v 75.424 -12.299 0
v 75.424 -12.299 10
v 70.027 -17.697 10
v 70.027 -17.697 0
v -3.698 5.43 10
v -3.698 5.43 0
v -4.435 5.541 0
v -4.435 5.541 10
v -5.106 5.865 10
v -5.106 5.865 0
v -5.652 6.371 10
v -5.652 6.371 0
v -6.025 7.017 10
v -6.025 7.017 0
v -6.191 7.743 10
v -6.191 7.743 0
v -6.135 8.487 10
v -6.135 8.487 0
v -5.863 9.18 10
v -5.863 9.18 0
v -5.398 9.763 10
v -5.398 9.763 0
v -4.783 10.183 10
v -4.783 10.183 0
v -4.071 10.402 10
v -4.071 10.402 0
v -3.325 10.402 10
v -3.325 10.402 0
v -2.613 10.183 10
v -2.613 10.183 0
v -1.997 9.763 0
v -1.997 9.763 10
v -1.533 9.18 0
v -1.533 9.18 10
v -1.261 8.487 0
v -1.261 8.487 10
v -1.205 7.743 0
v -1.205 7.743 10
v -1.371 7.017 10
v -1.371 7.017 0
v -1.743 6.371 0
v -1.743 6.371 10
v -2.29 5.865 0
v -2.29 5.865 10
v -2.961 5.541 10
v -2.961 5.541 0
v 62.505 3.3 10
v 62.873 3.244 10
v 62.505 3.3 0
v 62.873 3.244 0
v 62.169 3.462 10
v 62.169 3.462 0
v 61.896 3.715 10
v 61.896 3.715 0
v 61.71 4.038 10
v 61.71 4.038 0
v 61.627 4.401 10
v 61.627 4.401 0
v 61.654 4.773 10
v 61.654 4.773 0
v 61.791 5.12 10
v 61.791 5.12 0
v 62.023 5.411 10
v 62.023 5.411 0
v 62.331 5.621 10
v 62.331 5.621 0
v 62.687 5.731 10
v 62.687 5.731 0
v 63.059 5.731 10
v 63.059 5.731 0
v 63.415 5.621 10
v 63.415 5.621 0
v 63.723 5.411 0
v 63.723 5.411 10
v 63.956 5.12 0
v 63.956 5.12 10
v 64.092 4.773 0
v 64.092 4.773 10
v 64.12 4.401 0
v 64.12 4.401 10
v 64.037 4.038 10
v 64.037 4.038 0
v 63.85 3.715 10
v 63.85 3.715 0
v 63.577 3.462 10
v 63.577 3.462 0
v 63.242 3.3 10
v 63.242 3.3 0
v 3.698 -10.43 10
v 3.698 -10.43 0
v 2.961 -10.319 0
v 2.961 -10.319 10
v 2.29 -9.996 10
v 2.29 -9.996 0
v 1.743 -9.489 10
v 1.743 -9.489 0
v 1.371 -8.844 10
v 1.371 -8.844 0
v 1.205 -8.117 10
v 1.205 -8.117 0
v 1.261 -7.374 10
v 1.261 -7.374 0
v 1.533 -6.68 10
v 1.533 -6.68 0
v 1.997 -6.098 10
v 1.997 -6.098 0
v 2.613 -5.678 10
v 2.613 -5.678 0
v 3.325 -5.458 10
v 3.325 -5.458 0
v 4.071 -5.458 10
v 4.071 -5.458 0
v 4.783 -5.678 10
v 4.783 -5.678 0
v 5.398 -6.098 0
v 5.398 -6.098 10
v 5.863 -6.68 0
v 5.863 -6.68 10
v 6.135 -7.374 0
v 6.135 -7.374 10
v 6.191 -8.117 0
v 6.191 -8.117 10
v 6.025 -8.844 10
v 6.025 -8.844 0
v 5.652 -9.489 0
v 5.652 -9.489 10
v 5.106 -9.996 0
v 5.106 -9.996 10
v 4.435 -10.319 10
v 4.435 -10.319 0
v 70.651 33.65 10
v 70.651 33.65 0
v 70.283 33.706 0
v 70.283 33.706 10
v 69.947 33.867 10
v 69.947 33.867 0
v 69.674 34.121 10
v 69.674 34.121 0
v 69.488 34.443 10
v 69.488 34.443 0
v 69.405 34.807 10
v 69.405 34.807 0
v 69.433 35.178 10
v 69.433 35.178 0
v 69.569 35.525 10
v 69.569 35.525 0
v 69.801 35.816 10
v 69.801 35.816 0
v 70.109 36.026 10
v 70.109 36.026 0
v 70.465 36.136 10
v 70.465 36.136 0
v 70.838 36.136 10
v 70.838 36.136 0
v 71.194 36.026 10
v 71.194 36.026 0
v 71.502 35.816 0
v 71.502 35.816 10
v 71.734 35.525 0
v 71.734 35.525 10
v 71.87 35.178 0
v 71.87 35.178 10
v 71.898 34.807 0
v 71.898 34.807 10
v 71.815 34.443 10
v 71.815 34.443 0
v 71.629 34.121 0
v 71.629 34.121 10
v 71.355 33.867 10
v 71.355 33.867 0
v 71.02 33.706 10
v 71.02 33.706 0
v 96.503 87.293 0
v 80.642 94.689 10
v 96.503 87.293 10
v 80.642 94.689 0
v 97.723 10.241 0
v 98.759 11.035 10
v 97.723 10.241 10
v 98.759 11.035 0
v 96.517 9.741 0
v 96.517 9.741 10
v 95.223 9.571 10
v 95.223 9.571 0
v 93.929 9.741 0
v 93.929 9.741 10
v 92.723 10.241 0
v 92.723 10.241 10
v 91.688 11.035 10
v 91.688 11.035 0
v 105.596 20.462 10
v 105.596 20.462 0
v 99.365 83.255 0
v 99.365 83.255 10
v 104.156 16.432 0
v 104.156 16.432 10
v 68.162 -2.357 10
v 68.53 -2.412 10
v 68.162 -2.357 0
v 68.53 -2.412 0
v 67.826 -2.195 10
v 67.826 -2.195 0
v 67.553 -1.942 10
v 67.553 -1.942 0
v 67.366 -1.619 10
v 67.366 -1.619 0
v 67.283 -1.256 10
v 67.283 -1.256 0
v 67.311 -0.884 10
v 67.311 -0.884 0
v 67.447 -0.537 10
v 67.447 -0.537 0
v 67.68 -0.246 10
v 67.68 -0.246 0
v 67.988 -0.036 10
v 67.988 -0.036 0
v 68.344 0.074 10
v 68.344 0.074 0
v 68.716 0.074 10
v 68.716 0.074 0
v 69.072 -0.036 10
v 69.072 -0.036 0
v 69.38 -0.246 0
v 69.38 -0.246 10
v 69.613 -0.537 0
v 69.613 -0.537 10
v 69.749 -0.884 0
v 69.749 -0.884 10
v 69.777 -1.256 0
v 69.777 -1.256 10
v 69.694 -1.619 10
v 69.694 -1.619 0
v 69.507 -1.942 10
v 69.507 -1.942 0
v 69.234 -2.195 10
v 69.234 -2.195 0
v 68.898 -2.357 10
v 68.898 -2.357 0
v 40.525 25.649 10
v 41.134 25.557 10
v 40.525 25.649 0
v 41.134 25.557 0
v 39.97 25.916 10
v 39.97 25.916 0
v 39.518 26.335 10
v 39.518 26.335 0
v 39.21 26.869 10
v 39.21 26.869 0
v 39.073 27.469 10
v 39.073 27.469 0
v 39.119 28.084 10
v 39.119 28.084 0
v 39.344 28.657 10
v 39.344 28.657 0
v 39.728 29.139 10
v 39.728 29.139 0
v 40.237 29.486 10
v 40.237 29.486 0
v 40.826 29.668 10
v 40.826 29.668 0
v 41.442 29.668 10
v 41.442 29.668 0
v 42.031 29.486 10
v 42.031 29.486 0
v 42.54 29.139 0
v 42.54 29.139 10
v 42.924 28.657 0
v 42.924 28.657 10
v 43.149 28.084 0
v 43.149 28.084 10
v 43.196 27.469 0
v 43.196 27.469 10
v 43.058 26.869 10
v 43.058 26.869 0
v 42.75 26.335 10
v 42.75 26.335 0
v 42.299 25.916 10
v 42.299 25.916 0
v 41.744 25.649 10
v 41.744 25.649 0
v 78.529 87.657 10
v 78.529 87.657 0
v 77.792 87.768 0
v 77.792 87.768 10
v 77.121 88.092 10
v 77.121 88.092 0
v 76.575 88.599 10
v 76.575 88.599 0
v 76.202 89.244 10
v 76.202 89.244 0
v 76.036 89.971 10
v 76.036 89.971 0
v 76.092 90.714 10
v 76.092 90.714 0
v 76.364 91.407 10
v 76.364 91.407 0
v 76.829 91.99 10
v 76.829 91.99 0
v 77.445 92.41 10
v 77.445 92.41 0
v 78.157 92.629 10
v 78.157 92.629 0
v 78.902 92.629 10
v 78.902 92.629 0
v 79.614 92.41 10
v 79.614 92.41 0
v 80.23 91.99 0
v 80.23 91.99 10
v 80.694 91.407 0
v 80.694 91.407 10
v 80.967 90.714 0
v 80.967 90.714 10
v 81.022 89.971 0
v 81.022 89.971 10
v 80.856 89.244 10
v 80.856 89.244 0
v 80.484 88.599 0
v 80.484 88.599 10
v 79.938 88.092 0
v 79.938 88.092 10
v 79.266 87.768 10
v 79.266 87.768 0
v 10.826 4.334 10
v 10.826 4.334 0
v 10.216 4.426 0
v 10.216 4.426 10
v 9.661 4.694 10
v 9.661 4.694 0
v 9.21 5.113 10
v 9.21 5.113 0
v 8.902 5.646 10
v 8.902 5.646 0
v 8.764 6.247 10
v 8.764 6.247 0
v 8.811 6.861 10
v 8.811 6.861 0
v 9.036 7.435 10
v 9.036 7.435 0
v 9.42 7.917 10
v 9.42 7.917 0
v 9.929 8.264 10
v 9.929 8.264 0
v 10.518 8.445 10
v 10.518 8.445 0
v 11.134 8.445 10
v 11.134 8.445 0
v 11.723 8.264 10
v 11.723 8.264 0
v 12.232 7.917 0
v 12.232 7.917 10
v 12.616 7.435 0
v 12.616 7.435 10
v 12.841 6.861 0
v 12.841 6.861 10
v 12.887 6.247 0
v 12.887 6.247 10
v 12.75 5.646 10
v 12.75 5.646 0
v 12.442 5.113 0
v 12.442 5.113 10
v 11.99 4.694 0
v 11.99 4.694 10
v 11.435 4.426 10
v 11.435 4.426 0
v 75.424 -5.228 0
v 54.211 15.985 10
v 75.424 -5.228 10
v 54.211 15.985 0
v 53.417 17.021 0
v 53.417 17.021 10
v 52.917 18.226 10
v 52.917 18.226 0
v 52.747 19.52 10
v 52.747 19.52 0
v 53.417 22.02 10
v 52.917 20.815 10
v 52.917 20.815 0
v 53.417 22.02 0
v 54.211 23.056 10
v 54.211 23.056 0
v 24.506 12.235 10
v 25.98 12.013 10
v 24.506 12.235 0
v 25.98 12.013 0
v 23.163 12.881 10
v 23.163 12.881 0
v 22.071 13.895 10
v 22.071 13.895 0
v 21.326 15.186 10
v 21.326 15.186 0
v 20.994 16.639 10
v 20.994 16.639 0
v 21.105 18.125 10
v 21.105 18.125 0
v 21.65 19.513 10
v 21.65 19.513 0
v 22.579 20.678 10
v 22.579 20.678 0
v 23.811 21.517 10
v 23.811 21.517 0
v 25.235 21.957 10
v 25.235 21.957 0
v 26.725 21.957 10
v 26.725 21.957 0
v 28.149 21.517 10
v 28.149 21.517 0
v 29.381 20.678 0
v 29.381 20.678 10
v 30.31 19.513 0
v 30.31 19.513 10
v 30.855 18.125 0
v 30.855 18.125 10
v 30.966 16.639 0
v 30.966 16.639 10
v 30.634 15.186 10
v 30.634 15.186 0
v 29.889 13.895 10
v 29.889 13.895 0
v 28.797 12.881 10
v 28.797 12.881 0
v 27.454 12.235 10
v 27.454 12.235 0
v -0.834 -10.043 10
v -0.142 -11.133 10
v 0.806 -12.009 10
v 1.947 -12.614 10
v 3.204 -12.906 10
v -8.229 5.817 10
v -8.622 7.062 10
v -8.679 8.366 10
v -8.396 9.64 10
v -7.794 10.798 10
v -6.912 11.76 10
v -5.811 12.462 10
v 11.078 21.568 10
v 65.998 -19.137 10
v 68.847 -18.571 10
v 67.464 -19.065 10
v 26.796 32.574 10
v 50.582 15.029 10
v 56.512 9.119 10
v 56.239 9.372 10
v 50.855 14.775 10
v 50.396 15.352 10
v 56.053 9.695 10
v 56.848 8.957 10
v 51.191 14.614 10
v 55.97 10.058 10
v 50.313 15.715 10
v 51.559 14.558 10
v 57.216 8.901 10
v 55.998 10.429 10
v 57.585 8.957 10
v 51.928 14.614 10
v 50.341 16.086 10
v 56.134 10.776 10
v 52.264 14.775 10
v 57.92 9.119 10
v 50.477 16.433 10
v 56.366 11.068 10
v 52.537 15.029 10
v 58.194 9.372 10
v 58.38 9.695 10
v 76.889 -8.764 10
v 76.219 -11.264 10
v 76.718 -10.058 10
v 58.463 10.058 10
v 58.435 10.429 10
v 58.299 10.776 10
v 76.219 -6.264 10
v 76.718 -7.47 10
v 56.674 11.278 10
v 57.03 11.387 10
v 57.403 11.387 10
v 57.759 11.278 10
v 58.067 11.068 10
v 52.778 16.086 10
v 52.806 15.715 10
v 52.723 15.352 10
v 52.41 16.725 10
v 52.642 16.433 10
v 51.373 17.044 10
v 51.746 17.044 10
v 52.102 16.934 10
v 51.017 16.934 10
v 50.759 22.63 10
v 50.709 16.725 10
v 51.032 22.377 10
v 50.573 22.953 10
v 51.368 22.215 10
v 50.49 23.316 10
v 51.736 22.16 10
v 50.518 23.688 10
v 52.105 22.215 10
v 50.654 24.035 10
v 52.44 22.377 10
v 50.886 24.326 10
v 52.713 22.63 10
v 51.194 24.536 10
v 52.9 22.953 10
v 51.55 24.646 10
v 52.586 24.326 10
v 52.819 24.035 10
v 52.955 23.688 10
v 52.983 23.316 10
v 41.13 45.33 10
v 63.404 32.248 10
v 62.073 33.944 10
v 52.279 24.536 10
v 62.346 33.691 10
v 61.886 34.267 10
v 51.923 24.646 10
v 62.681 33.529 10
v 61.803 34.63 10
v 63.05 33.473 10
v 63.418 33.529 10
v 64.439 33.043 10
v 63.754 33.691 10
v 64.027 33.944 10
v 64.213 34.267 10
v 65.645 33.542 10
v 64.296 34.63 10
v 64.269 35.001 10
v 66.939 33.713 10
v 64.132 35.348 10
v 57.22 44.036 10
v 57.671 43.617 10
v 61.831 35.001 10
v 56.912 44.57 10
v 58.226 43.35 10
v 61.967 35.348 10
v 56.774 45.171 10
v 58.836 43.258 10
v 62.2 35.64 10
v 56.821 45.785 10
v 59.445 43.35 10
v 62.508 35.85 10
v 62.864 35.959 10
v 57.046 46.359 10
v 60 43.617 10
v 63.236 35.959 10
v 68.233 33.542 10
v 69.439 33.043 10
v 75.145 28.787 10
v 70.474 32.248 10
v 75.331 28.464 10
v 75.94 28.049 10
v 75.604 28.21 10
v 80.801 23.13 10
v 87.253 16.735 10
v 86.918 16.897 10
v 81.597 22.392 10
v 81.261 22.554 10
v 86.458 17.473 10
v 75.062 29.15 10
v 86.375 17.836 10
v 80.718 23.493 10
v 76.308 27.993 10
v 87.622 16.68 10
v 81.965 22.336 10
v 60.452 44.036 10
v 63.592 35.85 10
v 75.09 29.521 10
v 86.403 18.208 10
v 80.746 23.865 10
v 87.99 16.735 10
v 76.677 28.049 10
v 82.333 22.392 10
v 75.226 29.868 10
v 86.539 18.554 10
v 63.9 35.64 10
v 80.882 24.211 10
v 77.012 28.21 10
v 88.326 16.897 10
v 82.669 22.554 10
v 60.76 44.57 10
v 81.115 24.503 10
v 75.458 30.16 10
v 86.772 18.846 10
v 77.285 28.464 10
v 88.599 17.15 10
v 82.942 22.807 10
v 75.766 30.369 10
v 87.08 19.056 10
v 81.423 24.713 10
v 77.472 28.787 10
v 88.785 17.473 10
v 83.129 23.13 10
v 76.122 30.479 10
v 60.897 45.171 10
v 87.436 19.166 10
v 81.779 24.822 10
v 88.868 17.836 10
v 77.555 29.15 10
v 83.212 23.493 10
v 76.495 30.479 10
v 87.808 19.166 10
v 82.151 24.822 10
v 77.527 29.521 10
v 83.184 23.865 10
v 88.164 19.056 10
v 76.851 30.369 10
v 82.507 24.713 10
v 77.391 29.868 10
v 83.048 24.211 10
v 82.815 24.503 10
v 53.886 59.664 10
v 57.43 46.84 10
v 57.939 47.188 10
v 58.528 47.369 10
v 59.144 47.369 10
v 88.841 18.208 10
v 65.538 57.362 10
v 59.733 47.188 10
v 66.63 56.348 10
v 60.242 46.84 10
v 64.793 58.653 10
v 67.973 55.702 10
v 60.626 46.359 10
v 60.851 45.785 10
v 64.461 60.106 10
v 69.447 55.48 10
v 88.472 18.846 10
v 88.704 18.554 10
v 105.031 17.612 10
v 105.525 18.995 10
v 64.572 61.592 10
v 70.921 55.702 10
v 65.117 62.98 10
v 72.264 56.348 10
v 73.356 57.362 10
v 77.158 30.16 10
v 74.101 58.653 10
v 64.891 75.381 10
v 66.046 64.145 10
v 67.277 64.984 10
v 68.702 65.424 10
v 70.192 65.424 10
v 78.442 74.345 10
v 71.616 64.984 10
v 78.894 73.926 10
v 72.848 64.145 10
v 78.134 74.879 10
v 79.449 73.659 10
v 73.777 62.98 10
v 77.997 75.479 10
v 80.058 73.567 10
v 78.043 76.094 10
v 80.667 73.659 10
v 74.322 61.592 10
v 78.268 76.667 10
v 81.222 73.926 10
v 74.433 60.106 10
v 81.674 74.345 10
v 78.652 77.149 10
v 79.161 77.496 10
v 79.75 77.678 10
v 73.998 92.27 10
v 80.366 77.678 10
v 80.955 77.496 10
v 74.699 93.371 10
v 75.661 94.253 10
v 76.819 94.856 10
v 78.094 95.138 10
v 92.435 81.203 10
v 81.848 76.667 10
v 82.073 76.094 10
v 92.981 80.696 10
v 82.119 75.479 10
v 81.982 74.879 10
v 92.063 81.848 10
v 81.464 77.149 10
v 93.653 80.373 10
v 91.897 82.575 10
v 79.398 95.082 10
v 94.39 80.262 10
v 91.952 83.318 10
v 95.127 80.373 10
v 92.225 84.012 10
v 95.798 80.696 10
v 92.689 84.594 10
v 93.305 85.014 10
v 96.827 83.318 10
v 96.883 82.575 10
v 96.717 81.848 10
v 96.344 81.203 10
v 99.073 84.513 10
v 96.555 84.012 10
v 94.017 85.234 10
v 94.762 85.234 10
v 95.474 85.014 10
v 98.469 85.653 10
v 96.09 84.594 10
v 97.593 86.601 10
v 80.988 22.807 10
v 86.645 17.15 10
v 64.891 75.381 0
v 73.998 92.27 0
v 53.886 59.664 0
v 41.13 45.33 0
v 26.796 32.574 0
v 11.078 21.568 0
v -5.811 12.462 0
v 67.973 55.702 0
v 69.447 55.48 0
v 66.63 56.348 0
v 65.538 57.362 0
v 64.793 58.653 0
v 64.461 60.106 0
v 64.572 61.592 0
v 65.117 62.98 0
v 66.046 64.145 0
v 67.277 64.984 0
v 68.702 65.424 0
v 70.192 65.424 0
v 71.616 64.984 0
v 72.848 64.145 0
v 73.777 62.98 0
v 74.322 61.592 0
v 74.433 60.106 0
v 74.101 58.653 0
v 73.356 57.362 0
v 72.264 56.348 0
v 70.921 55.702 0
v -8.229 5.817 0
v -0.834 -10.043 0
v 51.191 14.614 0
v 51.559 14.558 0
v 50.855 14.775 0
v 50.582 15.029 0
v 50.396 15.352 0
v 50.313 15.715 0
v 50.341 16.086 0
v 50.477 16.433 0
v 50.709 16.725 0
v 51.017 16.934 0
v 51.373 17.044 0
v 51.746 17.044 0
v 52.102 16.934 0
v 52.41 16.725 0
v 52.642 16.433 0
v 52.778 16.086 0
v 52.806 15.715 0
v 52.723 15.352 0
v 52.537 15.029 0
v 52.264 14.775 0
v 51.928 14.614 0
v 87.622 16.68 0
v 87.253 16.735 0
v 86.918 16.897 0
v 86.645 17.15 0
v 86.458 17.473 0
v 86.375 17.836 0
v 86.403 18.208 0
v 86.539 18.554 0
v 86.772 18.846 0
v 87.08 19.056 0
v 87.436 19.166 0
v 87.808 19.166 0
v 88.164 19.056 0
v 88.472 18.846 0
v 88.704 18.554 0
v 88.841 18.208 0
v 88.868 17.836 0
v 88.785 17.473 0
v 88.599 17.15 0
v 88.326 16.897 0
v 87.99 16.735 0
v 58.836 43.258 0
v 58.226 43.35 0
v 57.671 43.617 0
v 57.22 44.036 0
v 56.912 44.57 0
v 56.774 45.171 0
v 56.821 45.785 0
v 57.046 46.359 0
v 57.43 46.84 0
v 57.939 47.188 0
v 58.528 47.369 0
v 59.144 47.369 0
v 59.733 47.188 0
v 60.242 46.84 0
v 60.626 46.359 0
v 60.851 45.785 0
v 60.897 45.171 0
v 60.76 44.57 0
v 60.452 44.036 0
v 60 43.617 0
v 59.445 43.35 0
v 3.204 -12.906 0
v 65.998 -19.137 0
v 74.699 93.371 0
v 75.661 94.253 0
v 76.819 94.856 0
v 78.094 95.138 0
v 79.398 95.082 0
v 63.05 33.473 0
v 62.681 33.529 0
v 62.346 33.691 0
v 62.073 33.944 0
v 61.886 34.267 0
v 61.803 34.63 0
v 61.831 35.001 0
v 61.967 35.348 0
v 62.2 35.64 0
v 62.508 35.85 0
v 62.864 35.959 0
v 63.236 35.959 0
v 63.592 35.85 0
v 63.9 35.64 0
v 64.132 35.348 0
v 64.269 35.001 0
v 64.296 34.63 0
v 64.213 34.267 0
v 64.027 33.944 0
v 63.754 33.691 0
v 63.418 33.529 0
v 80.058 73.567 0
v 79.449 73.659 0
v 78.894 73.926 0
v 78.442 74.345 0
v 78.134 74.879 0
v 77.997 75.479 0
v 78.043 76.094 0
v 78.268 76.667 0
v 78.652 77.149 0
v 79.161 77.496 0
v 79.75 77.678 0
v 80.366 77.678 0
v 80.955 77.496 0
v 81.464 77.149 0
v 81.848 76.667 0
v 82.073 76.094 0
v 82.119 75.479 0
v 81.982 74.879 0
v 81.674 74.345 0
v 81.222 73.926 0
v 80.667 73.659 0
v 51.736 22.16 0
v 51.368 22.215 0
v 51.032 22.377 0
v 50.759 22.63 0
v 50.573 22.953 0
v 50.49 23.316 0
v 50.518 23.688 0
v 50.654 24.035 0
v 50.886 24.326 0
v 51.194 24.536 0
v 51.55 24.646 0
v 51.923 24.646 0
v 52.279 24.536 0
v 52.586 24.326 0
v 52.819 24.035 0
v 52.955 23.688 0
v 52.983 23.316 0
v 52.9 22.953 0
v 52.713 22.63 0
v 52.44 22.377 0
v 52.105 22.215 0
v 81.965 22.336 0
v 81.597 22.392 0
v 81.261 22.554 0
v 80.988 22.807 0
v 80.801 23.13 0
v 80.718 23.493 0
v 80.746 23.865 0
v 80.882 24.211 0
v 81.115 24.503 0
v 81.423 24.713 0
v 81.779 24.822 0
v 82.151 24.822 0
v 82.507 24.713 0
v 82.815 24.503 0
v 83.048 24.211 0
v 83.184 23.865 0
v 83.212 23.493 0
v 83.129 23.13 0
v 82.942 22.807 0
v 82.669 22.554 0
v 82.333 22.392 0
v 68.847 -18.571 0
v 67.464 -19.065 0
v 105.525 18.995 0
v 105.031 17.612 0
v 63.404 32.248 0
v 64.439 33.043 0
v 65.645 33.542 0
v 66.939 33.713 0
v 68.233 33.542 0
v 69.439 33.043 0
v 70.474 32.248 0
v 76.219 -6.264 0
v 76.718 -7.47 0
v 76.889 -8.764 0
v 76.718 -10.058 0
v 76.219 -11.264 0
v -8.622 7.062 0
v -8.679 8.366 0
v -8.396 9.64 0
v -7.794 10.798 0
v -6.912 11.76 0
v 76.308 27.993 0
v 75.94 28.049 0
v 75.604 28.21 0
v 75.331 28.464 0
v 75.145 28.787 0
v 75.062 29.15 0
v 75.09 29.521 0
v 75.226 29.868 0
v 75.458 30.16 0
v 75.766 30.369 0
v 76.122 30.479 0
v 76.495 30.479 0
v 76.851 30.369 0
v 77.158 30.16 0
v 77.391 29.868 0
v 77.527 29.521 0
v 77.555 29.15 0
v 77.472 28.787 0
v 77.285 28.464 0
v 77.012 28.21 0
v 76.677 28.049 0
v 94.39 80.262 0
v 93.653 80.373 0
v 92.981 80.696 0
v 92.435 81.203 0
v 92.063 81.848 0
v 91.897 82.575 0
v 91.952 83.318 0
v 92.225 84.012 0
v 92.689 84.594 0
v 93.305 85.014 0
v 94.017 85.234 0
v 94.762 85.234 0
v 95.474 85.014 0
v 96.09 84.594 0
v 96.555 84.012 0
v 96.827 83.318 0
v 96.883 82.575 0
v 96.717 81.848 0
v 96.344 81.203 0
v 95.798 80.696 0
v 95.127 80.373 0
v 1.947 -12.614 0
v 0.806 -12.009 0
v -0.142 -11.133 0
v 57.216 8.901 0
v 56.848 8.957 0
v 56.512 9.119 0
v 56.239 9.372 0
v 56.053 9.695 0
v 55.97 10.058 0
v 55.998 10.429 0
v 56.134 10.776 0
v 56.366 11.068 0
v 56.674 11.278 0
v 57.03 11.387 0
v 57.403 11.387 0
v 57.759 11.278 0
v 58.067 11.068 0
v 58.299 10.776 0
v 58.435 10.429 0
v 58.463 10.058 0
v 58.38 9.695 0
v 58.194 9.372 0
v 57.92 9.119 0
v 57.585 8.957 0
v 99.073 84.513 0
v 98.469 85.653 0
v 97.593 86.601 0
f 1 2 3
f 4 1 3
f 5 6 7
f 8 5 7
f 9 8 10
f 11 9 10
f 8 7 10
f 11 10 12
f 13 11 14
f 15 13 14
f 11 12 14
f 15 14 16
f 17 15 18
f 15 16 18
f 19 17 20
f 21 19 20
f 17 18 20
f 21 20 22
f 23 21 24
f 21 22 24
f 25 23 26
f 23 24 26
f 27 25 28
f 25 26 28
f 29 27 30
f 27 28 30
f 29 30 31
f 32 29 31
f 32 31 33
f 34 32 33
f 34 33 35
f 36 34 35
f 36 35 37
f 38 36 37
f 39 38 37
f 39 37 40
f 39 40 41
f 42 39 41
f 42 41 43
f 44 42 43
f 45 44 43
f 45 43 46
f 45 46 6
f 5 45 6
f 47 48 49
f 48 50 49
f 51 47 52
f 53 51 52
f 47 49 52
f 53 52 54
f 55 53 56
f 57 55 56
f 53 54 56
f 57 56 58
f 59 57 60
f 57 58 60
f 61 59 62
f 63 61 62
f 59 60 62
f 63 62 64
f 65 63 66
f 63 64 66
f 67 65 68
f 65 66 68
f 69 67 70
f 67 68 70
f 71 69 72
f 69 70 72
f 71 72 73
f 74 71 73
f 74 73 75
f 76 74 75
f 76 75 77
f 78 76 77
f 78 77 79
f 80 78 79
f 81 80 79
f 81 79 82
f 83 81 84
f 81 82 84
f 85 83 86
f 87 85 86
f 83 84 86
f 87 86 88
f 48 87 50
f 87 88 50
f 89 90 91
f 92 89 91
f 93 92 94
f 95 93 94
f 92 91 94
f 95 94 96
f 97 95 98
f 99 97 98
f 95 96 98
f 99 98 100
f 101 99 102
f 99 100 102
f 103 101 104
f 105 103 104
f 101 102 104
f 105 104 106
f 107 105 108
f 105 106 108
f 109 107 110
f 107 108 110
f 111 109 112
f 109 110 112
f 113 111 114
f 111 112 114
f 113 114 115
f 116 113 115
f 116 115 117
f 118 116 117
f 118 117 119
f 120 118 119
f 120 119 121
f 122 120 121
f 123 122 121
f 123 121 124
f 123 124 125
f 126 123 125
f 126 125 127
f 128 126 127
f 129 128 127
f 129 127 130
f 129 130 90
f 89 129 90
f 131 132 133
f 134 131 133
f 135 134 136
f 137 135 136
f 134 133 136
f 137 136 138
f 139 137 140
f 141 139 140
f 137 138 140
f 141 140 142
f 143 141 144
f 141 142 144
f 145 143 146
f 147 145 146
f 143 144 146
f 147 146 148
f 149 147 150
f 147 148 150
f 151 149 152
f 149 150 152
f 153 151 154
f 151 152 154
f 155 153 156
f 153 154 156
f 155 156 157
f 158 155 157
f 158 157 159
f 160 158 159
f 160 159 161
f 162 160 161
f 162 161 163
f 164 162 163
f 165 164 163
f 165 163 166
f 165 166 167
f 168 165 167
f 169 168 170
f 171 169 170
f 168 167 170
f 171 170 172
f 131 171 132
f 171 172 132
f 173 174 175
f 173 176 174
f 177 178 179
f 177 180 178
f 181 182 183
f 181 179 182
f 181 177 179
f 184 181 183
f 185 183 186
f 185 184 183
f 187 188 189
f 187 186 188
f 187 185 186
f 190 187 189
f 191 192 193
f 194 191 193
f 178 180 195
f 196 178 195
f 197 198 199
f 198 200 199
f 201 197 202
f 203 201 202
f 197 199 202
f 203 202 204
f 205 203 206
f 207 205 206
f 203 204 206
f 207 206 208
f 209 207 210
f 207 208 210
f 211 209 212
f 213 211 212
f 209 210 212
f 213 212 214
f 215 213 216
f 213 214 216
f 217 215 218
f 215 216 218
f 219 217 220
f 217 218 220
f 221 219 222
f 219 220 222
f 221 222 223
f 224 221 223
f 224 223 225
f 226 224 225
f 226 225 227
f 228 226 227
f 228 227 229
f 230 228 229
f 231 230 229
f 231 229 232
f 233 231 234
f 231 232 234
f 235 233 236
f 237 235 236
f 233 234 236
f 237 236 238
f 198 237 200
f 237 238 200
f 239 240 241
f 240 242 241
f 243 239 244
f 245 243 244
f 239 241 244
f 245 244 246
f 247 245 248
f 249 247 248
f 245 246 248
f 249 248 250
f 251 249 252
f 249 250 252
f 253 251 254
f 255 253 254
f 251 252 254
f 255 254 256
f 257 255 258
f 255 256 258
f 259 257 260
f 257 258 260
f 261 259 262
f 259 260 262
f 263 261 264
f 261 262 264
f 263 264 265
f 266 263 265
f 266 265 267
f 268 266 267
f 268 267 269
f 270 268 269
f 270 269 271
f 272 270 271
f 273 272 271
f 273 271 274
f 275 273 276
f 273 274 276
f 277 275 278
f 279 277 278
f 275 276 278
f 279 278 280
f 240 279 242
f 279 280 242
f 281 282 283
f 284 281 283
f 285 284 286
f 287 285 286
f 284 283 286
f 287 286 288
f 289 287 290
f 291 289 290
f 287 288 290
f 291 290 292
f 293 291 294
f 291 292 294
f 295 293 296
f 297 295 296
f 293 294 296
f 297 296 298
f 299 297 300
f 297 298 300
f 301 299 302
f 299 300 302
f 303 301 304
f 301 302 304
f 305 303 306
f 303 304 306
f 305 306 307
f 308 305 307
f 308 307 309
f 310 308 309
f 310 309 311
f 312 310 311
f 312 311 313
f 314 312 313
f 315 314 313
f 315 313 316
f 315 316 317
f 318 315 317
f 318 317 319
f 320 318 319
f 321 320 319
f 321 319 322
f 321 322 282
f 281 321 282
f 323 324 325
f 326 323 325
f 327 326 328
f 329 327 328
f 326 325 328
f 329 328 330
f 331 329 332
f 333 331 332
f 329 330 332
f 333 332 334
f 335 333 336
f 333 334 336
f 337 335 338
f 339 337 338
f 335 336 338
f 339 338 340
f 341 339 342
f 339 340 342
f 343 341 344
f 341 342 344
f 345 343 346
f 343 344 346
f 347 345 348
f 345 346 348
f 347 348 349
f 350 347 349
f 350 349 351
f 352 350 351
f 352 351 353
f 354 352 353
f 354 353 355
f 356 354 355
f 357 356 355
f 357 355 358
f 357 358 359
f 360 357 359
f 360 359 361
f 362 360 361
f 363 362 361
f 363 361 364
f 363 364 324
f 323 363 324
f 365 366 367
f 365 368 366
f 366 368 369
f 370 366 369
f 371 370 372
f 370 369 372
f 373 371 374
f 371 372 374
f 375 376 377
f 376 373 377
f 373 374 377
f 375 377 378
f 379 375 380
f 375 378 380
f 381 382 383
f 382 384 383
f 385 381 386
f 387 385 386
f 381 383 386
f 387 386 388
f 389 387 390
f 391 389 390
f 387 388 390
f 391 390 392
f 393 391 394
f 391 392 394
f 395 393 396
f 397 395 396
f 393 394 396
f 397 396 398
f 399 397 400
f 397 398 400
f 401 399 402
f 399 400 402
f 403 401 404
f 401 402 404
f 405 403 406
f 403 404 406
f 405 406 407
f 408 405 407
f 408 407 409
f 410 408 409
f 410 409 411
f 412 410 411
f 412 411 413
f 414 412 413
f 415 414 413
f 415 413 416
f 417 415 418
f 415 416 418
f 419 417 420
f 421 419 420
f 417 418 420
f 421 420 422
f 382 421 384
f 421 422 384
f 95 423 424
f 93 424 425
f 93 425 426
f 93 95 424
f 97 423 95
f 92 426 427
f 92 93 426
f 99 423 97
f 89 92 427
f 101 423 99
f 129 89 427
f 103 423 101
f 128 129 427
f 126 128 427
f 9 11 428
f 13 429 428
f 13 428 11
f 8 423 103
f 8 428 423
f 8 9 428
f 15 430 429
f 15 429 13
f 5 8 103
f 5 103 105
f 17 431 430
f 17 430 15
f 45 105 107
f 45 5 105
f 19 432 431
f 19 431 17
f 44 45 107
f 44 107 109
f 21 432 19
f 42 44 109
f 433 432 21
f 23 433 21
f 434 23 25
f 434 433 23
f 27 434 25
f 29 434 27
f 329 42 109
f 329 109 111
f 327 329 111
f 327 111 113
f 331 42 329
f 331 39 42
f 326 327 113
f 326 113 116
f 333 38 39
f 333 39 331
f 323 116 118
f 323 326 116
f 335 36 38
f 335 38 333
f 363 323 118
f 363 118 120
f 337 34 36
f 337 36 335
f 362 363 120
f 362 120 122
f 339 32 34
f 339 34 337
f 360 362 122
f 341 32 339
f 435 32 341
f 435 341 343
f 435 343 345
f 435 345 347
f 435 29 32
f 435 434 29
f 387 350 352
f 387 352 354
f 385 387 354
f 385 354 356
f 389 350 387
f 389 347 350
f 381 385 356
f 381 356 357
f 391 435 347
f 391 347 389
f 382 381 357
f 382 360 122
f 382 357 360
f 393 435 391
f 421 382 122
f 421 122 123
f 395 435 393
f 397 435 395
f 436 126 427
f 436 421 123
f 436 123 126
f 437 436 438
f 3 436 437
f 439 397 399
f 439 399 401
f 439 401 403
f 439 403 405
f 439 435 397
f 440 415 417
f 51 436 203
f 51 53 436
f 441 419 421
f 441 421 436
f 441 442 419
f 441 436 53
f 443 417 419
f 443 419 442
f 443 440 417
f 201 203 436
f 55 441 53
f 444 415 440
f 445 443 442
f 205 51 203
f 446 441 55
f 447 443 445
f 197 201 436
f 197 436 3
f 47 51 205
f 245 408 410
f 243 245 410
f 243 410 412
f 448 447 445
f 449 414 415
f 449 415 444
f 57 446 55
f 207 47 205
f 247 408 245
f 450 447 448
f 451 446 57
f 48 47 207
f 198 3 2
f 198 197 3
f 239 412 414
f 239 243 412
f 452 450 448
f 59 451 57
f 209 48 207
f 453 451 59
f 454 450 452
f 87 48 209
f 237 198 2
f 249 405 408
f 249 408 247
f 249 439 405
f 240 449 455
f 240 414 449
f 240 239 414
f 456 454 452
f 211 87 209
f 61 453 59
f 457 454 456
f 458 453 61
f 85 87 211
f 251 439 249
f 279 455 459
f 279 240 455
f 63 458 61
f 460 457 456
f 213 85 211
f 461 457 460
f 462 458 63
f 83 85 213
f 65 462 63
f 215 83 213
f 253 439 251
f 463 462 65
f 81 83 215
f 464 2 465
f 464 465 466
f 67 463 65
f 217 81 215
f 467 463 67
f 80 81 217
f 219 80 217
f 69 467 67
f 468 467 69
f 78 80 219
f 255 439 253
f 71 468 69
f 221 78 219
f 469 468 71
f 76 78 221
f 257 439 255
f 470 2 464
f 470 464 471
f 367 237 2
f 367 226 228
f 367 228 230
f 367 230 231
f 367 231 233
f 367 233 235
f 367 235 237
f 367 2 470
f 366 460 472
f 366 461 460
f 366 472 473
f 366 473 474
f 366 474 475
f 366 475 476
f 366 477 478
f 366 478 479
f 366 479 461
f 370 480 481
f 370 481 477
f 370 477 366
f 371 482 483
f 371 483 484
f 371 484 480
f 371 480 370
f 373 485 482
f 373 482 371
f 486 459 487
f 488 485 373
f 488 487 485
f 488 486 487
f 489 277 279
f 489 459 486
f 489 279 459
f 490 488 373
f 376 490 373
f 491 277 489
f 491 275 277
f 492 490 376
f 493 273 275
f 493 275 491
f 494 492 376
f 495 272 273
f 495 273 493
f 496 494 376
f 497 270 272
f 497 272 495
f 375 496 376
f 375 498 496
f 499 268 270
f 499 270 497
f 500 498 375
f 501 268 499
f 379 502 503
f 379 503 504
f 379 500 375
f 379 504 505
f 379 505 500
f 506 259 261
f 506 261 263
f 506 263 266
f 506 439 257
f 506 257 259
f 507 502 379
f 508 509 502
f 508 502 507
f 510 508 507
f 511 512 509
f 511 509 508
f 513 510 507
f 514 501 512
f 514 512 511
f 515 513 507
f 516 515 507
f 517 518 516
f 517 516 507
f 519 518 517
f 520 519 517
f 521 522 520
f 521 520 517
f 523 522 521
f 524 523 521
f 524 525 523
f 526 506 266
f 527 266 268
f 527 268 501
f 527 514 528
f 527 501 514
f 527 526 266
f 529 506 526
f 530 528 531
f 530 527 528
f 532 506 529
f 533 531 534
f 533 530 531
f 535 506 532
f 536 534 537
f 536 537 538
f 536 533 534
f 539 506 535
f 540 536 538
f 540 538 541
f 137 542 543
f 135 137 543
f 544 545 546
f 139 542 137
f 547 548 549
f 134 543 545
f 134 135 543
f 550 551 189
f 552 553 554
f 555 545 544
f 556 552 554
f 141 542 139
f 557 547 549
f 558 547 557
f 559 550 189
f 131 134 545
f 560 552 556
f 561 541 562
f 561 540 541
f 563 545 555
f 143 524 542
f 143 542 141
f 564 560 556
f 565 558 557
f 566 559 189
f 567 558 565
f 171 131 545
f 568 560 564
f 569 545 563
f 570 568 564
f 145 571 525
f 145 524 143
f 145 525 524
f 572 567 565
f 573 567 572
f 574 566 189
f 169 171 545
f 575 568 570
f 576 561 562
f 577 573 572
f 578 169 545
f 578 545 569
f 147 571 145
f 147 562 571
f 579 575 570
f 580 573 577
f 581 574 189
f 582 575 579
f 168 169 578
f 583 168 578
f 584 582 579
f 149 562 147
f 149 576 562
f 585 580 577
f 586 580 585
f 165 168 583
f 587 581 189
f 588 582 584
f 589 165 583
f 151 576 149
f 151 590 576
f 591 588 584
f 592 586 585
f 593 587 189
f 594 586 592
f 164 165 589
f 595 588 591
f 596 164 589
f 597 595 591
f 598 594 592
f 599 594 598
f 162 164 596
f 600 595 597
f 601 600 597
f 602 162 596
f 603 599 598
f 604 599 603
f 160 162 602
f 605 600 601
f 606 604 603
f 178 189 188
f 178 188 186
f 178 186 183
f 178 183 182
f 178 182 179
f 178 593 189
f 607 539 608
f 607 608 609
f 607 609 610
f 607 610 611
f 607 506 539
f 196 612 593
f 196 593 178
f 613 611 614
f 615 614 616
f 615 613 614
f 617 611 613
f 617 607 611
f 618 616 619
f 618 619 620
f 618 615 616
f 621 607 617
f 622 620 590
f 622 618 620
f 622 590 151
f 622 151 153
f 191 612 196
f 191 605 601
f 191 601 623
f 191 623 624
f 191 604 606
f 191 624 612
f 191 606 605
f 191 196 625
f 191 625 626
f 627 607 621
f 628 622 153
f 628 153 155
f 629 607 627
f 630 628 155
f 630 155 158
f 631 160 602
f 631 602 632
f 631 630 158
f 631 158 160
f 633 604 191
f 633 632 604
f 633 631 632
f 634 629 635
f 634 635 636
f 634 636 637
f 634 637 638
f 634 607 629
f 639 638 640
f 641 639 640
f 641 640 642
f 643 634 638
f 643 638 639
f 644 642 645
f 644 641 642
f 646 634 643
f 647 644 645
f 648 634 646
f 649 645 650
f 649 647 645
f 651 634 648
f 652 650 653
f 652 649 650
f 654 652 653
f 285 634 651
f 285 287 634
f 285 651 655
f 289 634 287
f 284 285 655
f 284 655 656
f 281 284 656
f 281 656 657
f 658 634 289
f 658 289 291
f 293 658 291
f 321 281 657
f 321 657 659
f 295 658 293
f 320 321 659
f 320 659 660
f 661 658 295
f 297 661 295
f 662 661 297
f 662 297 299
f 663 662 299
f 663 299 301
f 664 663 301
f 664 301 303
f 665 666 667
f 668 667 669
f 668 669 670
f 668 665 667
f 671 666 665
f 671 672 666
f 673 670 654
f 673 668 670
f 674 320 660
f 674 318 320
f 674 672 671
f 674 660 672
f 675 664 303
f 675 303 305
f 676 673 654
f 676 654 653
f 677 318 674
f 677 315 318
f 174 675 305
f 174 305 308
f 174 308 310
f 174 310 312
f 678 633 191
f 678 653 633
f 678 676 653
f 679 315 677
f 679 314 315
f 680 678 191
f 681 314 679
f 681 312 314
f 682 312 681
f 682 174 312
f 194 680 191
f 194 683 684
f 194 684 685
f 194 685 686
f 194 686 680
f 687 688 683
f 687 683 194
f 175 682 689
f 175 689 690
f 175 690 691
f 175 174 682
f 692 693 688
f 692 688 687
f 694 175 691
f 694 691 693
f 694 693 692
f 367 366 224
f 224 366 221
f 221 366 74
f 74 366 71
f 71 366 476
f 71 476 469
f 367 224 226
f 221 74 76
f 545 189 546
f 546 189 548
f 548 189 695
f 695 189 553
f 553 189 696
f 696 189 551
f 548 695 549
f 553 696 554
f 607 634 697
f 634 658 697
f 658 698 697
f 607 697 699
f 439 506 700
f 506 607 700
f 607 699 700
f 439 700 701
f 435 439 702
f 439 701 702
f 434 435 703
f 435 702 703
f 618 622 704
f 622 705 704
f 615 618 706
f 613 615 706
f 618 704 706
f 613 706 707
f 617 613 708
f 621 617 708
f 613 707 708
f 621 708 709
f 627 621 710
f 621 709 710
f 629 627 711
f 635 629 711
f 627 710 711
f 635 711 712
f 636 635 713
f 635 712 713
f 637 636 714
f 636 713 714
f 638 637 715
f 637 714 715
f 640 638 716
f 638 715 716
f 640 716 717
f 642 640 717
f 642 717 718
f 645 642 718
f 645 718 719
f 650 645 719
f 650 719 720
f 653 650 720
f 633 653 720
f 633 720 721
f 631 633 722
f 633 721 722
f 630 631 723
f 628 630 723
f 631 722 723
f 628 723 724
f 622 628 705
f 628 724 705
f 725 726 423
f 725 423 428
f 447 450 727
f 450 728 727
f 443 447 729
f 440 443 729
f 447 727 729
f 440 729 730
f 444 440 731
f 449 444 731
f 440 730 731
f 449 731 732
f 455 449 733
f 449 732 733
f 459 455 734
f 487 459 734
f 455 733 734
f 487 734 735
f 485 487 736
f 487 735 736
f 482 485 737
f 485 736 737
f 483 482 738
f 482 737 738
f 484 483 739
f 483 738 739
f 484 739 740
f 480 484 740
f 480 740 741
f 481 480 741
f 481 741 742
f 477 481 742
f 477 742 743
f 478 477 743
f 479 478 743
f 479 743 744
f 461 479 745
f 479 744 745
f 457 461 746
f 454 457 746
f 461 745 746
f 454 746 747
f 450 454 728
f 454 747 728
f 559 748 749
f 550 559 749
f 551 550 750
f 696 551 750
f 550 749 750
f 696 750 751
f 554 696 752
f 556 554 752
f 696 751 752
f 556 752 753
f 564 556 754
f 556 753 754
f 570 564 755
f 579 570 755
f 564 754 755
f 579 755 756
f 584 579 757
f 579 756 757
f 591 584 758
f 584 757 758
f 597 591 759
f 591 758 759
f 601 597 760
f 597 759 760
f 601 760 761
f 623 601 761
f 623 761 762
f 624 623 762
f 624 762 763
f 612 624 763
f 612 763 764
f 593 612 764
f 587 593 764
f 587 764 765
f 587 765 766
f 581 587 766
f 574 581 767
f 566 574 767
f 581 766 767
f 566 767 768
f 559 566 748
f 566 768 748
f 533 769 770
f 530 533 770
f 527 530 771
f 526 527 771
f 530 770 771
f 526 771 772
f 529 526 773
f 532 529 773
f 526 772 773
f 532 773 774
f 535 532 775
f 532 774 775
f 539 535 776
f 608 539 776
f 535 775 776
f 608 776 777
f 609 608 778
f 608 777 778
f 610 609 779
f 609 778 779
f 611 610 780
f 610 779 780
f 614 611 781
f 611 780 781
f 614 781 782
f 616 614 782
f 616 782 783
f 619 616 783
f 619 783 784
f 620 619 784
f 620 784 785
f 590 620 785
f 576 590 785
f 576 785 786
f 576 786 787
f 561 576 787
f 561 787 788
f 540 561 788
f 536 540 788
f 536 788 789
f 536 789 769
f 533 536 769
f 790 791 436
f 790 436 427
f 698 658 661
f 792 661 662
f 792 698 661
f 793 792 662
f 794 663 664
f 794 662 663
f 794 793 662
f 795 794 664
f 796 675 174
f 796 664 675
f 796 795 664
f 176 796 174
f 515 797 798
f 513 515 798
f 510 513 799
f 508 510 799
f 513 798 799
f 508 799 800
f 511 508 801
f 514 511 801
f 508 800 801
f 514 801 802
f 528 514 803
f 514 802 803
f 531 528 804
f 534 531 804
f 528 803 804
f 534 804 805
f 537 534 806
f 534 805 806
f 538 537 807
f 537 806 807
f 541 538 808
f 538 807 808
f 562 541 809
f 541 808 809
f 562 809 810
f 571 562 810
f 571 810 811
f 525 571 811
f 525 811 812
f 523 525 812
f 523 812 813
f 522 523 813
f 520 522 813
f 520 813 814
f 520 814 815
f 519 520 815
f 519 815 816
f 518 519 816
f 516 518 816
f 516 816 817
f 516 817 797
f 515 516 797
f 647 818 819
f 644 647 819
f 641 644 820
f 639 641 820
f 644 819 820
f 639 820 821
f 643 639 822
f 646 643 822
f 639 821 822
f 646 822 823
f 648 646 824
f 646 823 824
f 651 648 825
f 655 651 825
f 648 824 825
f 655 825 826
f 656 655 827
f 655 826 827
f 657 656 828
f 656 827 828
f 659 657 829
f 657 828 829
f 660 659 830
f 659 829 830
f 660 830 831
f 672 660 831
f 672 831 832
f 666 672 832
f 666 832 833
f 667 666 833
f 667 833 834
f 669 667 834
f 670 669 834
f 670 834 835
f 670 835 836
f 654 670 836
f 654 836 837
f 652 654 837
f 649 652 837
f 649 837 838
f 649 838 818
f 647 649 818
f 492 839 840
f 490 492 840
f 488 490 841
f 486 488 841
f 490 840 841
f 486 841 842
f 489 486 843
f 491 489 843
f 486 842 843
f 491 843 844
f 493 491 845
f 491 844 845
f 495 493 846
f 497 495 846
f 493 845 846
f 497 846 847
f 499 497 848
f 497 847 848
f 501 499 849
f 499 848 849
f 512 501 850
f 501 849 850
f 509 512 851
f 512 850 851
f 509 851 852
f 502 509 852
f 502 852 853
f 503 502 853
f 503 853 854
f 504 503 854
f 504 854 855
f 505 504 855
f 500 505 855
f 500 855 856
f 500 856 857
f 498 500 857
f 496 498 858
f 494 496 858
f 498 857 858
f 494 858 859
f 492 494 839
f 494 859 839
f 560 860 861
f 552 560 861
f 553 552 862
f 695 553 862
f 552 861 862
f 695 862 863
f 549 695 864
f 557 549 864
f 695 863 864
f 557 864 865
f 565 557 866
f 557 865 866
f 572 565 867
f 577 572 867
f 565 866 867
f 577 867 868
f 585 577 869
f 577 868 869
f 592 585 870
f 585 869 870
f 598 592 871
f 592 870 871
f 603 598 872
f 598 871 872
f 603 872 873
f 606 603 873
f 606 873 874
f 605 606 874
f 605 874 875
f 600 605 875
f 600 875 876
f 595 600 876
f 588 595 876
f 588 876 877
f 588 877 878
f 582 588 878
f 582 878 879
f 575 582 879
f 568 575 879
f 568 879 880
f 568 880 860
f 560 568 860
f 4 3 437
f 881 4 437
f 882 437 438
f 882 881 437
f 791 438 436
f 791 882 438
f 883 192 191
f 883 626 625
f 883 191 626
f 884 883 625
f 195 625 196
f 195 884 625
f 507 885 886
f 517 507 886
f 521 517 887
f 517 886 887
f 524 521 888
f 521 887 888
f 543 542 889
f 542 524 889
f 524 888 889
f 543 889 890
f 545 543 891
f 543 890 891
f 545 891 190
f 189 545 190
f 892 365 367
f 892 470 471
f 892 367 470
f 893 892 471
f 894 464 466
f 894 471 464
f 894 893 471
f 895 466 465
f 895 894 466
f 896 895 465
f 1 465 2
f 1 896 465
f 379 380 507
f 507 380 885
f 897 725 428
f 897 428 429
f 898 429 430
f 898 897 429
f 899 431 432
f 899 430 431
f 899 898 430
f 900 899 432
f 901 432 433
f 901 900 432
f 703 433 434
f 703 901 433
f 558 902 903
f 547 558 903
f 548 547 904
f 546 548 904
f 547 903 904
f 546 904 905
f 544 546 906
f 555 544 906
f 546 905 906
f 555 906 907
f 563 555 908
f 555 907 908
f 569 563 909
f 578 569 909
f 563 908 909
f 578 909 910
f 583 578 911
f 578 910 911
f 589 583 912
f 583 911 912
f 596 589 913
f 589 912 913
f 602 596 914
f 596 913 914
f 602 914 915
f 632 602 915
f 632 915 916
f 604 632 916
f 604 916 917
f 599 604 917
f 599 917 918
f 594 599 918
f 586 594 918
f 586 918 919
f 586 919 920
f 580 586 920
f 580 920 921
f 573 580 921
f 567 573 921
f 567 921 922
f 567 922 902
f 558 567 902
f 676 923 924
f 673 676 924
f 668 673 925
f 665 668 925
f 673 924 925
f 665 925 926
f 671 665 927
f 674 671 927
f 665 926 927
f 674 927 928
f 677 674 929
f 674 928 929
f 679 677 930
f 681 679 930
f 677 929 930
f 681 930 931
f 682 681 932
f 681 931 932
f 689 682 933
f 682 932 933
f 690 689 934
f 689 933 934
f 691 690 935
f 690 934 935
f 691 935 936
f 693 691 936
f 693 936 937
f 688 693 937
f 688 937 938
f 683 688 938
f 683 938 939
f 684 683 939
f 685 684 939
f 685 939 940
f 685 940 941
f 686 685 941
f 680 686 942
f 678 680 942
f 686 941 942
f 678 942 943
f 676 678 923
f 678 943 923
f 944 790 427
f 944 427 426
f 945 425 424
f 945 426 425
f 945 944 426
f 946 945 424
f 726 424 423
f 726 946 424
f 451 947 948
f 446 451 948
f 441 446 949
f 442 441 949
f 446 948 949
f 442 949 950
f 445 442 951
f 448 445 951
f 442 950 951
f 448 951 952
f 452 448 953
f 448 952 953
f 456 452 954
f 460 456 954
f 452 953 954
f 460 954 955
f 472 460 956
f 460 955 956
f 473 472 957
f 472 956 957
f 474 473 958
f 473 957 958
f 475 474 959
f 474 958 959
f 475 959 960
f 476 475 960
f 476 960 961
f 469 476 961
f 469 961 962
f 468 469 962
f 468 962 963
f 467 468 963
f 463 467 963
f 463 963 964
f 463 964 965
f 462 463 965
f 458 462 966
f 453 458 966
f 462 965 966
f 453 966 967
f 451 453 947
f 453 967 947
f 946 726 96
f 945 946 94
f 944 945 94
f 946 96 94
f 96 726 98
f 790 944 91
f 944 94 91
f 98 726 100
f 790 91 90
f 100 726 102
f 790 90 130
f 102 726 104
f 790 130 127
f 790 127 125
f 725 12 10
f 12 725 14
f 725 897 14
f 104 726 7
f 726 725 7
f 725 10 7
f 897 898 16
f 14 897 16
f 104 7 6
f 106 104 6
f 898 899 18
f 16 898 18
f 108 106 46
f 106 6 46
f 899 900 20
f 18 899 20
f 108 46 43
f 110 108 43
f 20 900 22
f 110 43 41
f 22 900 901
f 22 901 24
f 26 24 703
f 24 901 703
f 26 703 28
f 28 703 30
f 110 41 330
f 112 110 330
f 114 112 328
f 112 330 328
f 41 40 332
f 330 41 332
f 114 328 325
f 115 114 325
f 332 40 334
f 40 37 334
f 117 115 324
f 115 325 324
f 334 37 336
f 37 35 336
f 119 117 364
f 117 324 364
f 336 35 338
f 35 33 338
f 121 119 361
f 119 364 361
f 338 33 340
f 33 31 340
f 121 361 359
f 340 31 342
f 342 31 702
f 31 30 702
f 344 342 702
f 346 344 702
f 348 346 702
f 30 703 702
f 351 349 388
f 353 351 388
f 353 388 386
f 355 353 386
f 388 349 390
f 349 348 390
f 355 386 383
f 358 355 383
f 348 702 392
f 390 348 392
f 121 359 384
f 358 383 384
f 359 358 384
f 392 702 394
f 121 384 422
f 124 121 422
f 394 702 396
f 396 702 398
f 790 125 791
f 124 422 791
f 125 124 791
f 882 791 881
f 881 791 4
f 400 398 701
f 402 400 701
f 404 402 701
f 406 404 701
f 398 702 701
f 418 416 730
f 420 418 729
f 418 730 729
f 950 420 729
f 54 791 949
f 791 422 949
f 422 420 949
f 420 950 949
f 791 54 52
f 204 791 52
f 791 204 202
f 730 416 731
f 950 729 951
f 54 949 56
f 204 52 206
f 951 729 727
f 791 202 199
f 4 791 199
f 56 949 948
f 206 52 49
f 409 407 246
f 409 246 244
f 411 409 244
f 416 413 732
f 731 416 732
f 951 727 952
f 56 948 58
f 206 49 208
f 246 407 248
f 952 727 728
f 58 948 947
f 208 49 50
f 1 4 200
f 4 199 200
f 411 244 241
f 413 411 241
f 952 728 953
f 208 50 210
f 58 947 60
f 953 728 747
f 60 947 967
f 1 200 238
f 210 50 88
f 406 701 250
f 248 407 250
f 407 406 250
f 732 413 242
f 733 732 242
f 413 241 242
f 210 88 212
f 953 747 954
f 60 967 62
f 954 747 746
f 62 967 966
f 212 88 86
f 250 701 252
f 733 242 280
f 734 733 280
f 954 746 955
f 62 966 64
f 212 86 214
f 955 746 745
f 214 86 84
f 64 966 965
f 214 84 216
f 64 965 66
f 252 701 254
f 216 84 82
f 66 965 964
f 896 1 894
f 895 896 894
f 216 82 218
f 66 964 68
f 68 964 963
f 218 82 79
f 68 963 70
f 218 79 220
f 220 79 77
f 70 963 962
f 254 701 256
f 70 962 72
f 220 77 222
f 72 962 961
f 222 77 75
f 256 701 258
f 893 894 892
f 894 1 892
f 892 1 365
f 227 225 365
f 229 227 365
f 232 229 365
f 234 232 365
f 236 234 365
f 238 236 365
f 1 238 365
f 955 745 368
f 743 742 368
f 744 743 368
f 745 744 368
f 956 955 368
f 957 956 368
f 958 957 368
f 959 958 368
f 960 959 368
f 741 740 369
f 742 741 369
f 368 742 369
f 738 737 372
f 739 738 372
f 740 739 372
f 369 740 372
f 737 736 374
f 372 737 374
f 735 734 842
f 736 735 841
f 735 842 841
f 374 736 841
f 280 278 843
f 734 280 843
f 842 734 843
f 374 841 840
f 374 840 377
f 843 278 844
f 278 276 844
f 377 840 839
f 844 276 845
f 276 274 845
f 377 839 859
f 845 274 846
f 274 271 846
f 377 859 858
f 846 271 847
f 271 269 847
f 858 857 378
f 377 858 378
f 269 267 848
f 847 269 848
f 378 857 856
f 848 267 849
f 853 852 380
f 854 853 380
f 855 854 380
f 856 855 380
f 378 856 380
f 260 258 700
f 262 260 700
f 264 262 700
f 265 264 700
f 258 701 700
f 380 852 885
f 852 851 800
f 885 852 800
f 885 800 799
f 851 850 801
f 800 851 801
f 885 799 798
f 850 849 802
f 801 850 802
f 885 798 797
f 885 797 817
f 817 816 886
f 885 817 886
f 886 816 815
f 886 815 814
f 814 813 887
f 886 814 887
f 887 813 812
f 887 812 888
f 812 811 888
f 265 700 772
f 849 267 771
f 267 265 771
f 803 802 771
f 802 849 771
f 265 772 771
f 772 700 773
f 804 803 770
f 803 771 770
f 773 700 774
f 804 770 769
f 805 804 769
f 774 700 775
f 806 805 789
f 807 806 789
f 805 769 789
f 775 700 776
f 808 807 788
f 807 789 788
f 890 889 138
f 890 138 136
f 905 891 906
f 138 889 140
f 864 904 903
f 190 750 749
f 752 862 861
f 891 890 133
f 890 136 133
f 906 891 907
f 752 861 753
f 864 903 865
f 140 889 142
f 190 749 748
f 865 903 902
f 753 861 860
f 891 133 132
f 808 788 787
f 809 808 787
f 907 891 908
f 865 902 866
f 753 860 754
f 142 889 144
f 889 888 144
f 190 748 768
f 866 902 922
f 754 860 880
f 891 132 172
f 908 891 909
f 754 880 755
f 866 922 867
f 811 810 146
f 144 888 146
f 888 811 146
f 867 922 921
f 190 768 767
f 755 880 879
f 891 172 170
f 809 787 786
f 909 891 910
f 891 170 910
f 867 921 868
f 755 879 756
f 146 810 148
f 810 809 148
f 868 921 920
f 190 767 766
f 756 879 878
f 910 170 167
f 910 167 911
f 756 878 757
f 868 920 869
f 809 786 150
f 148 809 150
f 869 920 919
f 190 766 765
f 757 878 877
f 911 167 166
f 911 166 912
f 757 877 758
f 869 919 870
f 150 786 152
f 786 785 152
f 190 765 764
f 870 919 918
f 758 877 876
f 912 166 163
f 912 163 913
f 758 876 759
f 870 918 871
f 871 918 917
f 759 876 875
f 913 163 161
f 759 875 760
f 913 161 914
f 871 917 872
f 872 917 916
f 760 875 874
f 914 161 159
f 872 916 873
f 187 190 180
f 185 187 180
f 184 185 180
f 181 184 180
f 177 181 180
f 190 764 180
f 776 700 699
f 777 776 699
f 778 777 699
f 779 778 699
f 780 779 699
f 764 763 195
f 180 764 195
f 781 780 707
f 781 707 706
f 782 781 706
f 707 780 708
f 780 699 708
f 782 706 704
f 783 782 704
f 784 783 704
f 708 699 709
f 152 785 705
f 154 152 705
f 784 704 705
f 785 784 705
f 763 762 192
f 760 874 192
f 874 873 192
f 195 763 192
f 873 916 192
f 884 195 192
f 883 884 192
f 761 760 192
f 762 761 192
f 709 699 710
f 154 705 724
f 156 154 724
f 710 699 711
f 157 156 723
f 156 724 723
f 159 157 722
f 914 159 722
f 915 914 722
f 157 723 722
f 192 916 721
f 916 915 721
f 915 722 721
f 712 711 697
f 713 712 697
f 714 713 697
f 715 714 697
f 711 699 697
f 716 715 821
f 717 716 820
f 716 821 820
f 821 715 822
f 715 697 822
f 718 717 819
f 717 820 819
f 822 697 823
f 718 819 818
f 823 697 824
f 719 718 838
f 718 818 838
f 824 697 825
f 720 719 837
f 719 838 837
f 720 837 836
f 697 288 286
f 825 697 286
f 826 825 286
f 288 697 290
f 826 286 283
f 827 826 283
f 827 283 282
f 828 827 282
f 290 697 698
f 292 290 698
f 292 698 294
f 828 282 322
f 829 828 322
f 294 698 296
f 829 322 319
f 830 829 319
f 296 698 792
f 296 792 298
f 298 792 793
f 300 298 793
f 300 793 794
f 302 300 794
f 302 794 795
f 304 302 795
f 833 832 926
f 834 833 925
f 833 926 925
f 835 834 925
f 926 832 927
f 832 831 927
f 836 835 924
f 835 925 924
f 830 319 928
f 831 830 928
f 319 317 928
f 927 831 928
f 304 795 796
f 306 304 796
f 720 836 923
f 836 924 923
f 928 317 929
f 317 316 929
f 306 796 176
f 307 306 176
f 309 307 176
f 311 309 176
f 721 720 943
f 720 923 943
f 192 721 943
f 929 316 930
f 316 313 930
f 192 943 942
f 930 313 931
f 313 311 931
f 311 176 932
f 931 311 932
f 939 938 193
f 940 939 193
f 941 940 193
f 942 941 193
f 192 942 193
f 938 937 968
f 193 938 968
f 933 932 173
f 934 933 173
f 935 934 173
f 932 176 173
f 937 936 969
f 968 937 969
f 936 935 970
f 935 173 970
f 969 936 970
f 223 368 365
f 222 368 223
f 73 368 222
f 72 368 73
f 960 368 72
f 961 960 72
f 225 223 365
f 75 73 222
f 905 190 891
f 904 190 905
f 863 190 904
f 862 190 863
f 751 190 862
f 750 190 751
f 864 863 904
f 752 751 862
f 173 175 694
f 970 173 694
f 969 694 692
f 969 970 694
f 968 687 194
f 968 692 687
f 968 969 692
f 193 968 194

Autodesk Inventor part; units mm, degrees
ref_plane "YZ Plane" through (0, 0, 0) normal (1, 0, 0) x (0, 1, 0)
ref_plane "XZ Plane" through (0, 0, 0) normal (0, 1, 0) x (-1, 0, 0)
ref_plane "XY Plane" through (0, 0, 0) normal (0, 0, 1) x (1, 0, 0)
sketch "Sketch1" plane through (0, 0, 0) normal (0, 0, 1) x (1, 0, 0)
  circle A0 centre (-3.6979, 7.9302) radius 2.5 construction
  circle A1 centre (3.6979, -7.9302) radius 2.5 construction
  line L0 (-8.2294, 5.8171) -> (-0.8336, -10.0433) construction
  arc A2 (-0.8336, -10.0433) -> (8.2294, -5.8171) centre (3.6979, -7.9302) ccw construction
  line L1 (8.2294, -5.8171) -> (0.8336, 10.0433) construction
  arc A3 (0.8336, 10.0433) -> (-8.2294, 5.8171) centre (-3.6979, 7.9302) ccw construction
  circle A4 centre (78.5293, 90.1574) radius 2.5 construction
  circle A5 centre (94.3897, 82.7616) radius 2.5 construction
  line L2 (76.4162, 85.6259) -> (92.2766, 78.2301) construction
  arc A6 (92.2766, 78.2301) -> (96.5028, 87.2931) centre (94.3897, 82.7616) ccw construction
  line L3 (96.5028, 87.2931) -> (80.6424, 94.689) construction
  arc A7 (80.6424, 94.689) -> (76.4162, 85.6259) centre (78.5293, 90.1574) ccw construction
  circle A8 centre (-75.543, 162.0025) radius 75 construction
  line L4 (112.457, 50.5739) -> (112.457, -27.9975) construction
  line L5 (107.457, -32.9975) -> (39.927, -32.9975) construction
  line L6 (-75.543, 162.0025) -> (58.8073, 27.6522) construction
  line L7 (54.2111, 23.056) -> (63.4035, 32.2484)
  line L8 (70.4745, 32.2484) -> (91.6877, 11.0352)
  line L9 (54.2111, 15.985) -> (75.4243, -5.2282)
  line L10 (75.4243, -12.2993) -> (70.027, -17.6966)
  line L11 (98.7588, 11.0352) -> (104.1561, 16.4325)
  line L12 (-0.8336, -10.0433) -> (-8.2294, 5.8171)
  line L13 (80.6424, 94.689) -> (96.5028, 87.2931)
  arc A9 (-5.811, 12.4617) -> (73.9978, 92.2705) centre (-75.543, 162.0025) ccw
  line L14 (-3.6979, 7.9302) -> (3.6979, -7.9302) construction
  line L15 (78.5293, 90.1574) -> (94.3897, 82.7616) construction
  line L16 (65.9977, -19.1366) -> (3.2042, -12.9058)
  line L17 (105.5961, 20.4618) -> (99.3653, 83.2553)
  arc A10 (75.4243, -12.2993) -> (75.4243, -5.2282) centre (71.8887, -8.7638) ccw
  arc A11 (54.2111, 23.056) -> (54.2111, 15.985) centre (57.7466, 19.5205) ccw
  arc A12 (70.4745, 32.2484) -> (63.4035, 32.2484) centre (66.939, 28.7129) ccw
  arc A13 (91.6877, 11.0352) -> (98.7588, 11.0352) centre (95.2233, 14.5708) ccw
  arc A14 (104.1561, 16.4325) -> (105.5961, 20.4618) centre (100.6206, 19.9681) ccw
  arc A15 (99.3653, 83.2553) -> (96.5028, 87.2931) centre (94.3897, 82.7616) ccw
  arc A16 (80.6424, 94.689) -> (73.9978, 92.2705) centre (78.5293, 90.1574) ccw
  arc A17 (-5.811, 12.4617) -> (-8.2294, 5.8171) centre (-3.6979, 7.9302) ccw
  arc A18 (-0.8336, -10.0433) -> (3.2042, -12.9058) centre (3.6979, -7.9302) ccw
  arc A19 (65.9977, -19.1366) -> (70.027, -17.6966) centre (66.4914, -14.1611) ccw
  point P0 (0, 0)
  point P1 (79.4008, -9.1758)
  point P2 (50.6755, 19.5205)
  point P3 (66.939, 35.784)
  point P4 (95.2233, 7.4997)
  point P5 (78.9598, -8.7638)
  point P6 (68.3532, -19.3704)
  point P7 (105.8299, 18.1063)
  point P8 (0.37, -12.6245)
  point P9 (76.0422, 96.8341)
  point P10 (99.084, 86.0895)
  point P11 (-10.3746, 10.4173)
  point P12 (-4.5315, -2.1131)
  point P13 (88.5726, 90.991)
  dimension "d56" = 190
  dimension "d64" = 23
  dimension "d65" = 40
  dimension "d67" = 165
  dimension "d68" = 15
  dimension "d69" = 15
  dimension "d70" = 20
  dimension "d73" = 5
extrude "Extrusion1" add sketch "Sketch1" along normal blind 10
sketch "Sketch2" plane through (0, 0, 10) normal (0, 0, 1) x (1, 0, 0)
  circle A0 centre (3.6979, -7.9302) radius 2.067 projected
  circle A1 centre (-3.6979, 7.9302) radius 2.067 projected
  circle A2 centre (94.3897, 82.7616) radius 2.067 projected
  circle A3 centre (78.5293, 90.1574) radius 2.067 projected
  point P0 (0, 0)
hole "Hole1" at (78.5293, 90.1574, 10) at (94.3897, 82.7616, 10) at (-3.6979, 7.9302, 10) at (3.6979, -7.9302, 10) direction (0, 0, -1) diameter 5 end through all
sketch "Sketch4" plane through (0, 0, 10) normal (0, 0, 1) x (1, 0, 0)
  circle A0 centre (-3.6979, 7.9302) radius 2.5 projected
  circle A1 centre (78.5293, 90.1574) radius 2.5 projected
  circle A2 centre (94.3897, 82.7616) radius 2.5 projected
  circle A3 centre (3.6979, -7.9302) radius 2.5 projected
  line L0 (-75.543, 162.0025) -> (25.98, 17.0126) construction
  line L1 (-75.543, 162.0025) -> (-3.6979, 7.9302) construction
  line L2 (78.5293, 90.1574) -> (-75.543, 162.0025) construction
  line L3 (-75.543, 162.0025) -> (69.4469, 60.4795) construction
  circle A4 centre (-75.543, 162.0025) radius 75 projected
  point P0 (0, 0)
  dimension "d27" = 10
  dimension "d28" = 10
  dimension "d71" = 177
  dimension "d72" = 177
hole "Hole2" at (25.98, 17.0126, 10) at (69.4469, 60.4795, 10) direction (0, 0, -1) diameter 10 end through all
sketch "Sketch6" plane through (0, 0, 10) normal (0, 0, 1) x (1, 0, 0)
  line L0 (25.98, 17.0126) -> (10.8257, 6.4014) construction
  line L1 (25.98, 17.0126) -> (41.1343, 27.6238) construction
  line L2 (25.98, 17.0126) -> (19.0971, 26.8424) construction
  line L3 (69.4469, 60.4795) -> (58.8357, 45.3252) construction
  line L4 (69.4469, 60.4795) -> (80.0581, 75.6338) construction
  line L5 (69.4469, 60.4795) -> (59.6171, 67.3624) construction
  arc A0 (-5.811, 12.4617) -> (73.9978, 92.2705) centre (-75.543, 162.0025) ccw projected
  circle A1 centre (69.4469, 60.4795) radius 5 projected
  circle A2 centre (25.98, 17.0126) radius 5 projected
  point P0 (0, 0)
  point P1 (76.0422, 96.8341)
  point P2 (-10.3746, 10.4173)
  dimension "d29" = 18.5
  dimension "d30" = 18.5
  dimension "d38" = 18.5
  dimension "d39" = 18.5
hole "Hole3" at (10.8257, 6.4014, 10) at (41.1343, 27.6238, 10) at (58.8357, 45.3252, 10) at (80.0581, 75.6338, 10) direction (0, 0, -1) diameter 4.134 end through all thread size "M5x0.8" class "6H" standard "ANSI Metric M Profile"
sketch "Sketch7" plane through (0, 0, 10) normal (0, 0, 1) x (1, 0, 0)
  arc A0 (50.3958, 16.2647) -> (52.016, 14.6445) centre (51.5594, 15.8082) ccw projected
  arc A1 (56.0526, 10.6079) -> (57.6728, 8.9877) centre (57.2163, 10.1513) ccw projected
  arc A2 (61.7095, 4.951) -> (63.3297, 3.3308) centre (62.8731, 4.4945) ccw projected
  arc A3 (67.3663, -0.7058) -> (68.9865, -2.326) centre (68.53, -1.1624) ccw projected
  arc A4 (71.815, 34.4435) -> (70.1948, 36.0637) centre (70.6513, 34.9001) ccw projected
  arc A5 (77.4718, 28.7867) -> (75.8516, 30.4069) centre (76.3082, 29.2432) ccw projected
  arc A6 (83.1287, 23.1298) -> (81.5085, 24.75) centre (81.965, 23.5864) ccw projected
  arc A7 (88.7855, 17.473) -> (87.1653, 19.0932) centre (87.6219, 17.9295) ccw projected
  arc A8 (63.5065, 35.8869) -> (61.8863, 34.2668) centre (63.0499, 34.7233) ccw projected
  arc A9 (52.1927, 24.5732) -> (50.5726, 22.953) centre (51.7362, 23.4096) ccw projected
  point P0 (0, 0)
hole "Hole4" at (51.7362, 23.4096, 10) at (63.0499, 34.7233, 10) at (51.5594, 15.8082, 10) at (57.2163, 10.1513, 10) at (62.8731, 4.4945, 10) at (70.6513, 34.9001, 10) at (76.3082, 29.2432, 10) at (81.965, 23.5864, 10) at (68.53, -1.1624, 10) at (87.6219, 17.9295, 10) direction (0, 0, -1) diameter 2.5 end through all
properties part number "motorplate"
